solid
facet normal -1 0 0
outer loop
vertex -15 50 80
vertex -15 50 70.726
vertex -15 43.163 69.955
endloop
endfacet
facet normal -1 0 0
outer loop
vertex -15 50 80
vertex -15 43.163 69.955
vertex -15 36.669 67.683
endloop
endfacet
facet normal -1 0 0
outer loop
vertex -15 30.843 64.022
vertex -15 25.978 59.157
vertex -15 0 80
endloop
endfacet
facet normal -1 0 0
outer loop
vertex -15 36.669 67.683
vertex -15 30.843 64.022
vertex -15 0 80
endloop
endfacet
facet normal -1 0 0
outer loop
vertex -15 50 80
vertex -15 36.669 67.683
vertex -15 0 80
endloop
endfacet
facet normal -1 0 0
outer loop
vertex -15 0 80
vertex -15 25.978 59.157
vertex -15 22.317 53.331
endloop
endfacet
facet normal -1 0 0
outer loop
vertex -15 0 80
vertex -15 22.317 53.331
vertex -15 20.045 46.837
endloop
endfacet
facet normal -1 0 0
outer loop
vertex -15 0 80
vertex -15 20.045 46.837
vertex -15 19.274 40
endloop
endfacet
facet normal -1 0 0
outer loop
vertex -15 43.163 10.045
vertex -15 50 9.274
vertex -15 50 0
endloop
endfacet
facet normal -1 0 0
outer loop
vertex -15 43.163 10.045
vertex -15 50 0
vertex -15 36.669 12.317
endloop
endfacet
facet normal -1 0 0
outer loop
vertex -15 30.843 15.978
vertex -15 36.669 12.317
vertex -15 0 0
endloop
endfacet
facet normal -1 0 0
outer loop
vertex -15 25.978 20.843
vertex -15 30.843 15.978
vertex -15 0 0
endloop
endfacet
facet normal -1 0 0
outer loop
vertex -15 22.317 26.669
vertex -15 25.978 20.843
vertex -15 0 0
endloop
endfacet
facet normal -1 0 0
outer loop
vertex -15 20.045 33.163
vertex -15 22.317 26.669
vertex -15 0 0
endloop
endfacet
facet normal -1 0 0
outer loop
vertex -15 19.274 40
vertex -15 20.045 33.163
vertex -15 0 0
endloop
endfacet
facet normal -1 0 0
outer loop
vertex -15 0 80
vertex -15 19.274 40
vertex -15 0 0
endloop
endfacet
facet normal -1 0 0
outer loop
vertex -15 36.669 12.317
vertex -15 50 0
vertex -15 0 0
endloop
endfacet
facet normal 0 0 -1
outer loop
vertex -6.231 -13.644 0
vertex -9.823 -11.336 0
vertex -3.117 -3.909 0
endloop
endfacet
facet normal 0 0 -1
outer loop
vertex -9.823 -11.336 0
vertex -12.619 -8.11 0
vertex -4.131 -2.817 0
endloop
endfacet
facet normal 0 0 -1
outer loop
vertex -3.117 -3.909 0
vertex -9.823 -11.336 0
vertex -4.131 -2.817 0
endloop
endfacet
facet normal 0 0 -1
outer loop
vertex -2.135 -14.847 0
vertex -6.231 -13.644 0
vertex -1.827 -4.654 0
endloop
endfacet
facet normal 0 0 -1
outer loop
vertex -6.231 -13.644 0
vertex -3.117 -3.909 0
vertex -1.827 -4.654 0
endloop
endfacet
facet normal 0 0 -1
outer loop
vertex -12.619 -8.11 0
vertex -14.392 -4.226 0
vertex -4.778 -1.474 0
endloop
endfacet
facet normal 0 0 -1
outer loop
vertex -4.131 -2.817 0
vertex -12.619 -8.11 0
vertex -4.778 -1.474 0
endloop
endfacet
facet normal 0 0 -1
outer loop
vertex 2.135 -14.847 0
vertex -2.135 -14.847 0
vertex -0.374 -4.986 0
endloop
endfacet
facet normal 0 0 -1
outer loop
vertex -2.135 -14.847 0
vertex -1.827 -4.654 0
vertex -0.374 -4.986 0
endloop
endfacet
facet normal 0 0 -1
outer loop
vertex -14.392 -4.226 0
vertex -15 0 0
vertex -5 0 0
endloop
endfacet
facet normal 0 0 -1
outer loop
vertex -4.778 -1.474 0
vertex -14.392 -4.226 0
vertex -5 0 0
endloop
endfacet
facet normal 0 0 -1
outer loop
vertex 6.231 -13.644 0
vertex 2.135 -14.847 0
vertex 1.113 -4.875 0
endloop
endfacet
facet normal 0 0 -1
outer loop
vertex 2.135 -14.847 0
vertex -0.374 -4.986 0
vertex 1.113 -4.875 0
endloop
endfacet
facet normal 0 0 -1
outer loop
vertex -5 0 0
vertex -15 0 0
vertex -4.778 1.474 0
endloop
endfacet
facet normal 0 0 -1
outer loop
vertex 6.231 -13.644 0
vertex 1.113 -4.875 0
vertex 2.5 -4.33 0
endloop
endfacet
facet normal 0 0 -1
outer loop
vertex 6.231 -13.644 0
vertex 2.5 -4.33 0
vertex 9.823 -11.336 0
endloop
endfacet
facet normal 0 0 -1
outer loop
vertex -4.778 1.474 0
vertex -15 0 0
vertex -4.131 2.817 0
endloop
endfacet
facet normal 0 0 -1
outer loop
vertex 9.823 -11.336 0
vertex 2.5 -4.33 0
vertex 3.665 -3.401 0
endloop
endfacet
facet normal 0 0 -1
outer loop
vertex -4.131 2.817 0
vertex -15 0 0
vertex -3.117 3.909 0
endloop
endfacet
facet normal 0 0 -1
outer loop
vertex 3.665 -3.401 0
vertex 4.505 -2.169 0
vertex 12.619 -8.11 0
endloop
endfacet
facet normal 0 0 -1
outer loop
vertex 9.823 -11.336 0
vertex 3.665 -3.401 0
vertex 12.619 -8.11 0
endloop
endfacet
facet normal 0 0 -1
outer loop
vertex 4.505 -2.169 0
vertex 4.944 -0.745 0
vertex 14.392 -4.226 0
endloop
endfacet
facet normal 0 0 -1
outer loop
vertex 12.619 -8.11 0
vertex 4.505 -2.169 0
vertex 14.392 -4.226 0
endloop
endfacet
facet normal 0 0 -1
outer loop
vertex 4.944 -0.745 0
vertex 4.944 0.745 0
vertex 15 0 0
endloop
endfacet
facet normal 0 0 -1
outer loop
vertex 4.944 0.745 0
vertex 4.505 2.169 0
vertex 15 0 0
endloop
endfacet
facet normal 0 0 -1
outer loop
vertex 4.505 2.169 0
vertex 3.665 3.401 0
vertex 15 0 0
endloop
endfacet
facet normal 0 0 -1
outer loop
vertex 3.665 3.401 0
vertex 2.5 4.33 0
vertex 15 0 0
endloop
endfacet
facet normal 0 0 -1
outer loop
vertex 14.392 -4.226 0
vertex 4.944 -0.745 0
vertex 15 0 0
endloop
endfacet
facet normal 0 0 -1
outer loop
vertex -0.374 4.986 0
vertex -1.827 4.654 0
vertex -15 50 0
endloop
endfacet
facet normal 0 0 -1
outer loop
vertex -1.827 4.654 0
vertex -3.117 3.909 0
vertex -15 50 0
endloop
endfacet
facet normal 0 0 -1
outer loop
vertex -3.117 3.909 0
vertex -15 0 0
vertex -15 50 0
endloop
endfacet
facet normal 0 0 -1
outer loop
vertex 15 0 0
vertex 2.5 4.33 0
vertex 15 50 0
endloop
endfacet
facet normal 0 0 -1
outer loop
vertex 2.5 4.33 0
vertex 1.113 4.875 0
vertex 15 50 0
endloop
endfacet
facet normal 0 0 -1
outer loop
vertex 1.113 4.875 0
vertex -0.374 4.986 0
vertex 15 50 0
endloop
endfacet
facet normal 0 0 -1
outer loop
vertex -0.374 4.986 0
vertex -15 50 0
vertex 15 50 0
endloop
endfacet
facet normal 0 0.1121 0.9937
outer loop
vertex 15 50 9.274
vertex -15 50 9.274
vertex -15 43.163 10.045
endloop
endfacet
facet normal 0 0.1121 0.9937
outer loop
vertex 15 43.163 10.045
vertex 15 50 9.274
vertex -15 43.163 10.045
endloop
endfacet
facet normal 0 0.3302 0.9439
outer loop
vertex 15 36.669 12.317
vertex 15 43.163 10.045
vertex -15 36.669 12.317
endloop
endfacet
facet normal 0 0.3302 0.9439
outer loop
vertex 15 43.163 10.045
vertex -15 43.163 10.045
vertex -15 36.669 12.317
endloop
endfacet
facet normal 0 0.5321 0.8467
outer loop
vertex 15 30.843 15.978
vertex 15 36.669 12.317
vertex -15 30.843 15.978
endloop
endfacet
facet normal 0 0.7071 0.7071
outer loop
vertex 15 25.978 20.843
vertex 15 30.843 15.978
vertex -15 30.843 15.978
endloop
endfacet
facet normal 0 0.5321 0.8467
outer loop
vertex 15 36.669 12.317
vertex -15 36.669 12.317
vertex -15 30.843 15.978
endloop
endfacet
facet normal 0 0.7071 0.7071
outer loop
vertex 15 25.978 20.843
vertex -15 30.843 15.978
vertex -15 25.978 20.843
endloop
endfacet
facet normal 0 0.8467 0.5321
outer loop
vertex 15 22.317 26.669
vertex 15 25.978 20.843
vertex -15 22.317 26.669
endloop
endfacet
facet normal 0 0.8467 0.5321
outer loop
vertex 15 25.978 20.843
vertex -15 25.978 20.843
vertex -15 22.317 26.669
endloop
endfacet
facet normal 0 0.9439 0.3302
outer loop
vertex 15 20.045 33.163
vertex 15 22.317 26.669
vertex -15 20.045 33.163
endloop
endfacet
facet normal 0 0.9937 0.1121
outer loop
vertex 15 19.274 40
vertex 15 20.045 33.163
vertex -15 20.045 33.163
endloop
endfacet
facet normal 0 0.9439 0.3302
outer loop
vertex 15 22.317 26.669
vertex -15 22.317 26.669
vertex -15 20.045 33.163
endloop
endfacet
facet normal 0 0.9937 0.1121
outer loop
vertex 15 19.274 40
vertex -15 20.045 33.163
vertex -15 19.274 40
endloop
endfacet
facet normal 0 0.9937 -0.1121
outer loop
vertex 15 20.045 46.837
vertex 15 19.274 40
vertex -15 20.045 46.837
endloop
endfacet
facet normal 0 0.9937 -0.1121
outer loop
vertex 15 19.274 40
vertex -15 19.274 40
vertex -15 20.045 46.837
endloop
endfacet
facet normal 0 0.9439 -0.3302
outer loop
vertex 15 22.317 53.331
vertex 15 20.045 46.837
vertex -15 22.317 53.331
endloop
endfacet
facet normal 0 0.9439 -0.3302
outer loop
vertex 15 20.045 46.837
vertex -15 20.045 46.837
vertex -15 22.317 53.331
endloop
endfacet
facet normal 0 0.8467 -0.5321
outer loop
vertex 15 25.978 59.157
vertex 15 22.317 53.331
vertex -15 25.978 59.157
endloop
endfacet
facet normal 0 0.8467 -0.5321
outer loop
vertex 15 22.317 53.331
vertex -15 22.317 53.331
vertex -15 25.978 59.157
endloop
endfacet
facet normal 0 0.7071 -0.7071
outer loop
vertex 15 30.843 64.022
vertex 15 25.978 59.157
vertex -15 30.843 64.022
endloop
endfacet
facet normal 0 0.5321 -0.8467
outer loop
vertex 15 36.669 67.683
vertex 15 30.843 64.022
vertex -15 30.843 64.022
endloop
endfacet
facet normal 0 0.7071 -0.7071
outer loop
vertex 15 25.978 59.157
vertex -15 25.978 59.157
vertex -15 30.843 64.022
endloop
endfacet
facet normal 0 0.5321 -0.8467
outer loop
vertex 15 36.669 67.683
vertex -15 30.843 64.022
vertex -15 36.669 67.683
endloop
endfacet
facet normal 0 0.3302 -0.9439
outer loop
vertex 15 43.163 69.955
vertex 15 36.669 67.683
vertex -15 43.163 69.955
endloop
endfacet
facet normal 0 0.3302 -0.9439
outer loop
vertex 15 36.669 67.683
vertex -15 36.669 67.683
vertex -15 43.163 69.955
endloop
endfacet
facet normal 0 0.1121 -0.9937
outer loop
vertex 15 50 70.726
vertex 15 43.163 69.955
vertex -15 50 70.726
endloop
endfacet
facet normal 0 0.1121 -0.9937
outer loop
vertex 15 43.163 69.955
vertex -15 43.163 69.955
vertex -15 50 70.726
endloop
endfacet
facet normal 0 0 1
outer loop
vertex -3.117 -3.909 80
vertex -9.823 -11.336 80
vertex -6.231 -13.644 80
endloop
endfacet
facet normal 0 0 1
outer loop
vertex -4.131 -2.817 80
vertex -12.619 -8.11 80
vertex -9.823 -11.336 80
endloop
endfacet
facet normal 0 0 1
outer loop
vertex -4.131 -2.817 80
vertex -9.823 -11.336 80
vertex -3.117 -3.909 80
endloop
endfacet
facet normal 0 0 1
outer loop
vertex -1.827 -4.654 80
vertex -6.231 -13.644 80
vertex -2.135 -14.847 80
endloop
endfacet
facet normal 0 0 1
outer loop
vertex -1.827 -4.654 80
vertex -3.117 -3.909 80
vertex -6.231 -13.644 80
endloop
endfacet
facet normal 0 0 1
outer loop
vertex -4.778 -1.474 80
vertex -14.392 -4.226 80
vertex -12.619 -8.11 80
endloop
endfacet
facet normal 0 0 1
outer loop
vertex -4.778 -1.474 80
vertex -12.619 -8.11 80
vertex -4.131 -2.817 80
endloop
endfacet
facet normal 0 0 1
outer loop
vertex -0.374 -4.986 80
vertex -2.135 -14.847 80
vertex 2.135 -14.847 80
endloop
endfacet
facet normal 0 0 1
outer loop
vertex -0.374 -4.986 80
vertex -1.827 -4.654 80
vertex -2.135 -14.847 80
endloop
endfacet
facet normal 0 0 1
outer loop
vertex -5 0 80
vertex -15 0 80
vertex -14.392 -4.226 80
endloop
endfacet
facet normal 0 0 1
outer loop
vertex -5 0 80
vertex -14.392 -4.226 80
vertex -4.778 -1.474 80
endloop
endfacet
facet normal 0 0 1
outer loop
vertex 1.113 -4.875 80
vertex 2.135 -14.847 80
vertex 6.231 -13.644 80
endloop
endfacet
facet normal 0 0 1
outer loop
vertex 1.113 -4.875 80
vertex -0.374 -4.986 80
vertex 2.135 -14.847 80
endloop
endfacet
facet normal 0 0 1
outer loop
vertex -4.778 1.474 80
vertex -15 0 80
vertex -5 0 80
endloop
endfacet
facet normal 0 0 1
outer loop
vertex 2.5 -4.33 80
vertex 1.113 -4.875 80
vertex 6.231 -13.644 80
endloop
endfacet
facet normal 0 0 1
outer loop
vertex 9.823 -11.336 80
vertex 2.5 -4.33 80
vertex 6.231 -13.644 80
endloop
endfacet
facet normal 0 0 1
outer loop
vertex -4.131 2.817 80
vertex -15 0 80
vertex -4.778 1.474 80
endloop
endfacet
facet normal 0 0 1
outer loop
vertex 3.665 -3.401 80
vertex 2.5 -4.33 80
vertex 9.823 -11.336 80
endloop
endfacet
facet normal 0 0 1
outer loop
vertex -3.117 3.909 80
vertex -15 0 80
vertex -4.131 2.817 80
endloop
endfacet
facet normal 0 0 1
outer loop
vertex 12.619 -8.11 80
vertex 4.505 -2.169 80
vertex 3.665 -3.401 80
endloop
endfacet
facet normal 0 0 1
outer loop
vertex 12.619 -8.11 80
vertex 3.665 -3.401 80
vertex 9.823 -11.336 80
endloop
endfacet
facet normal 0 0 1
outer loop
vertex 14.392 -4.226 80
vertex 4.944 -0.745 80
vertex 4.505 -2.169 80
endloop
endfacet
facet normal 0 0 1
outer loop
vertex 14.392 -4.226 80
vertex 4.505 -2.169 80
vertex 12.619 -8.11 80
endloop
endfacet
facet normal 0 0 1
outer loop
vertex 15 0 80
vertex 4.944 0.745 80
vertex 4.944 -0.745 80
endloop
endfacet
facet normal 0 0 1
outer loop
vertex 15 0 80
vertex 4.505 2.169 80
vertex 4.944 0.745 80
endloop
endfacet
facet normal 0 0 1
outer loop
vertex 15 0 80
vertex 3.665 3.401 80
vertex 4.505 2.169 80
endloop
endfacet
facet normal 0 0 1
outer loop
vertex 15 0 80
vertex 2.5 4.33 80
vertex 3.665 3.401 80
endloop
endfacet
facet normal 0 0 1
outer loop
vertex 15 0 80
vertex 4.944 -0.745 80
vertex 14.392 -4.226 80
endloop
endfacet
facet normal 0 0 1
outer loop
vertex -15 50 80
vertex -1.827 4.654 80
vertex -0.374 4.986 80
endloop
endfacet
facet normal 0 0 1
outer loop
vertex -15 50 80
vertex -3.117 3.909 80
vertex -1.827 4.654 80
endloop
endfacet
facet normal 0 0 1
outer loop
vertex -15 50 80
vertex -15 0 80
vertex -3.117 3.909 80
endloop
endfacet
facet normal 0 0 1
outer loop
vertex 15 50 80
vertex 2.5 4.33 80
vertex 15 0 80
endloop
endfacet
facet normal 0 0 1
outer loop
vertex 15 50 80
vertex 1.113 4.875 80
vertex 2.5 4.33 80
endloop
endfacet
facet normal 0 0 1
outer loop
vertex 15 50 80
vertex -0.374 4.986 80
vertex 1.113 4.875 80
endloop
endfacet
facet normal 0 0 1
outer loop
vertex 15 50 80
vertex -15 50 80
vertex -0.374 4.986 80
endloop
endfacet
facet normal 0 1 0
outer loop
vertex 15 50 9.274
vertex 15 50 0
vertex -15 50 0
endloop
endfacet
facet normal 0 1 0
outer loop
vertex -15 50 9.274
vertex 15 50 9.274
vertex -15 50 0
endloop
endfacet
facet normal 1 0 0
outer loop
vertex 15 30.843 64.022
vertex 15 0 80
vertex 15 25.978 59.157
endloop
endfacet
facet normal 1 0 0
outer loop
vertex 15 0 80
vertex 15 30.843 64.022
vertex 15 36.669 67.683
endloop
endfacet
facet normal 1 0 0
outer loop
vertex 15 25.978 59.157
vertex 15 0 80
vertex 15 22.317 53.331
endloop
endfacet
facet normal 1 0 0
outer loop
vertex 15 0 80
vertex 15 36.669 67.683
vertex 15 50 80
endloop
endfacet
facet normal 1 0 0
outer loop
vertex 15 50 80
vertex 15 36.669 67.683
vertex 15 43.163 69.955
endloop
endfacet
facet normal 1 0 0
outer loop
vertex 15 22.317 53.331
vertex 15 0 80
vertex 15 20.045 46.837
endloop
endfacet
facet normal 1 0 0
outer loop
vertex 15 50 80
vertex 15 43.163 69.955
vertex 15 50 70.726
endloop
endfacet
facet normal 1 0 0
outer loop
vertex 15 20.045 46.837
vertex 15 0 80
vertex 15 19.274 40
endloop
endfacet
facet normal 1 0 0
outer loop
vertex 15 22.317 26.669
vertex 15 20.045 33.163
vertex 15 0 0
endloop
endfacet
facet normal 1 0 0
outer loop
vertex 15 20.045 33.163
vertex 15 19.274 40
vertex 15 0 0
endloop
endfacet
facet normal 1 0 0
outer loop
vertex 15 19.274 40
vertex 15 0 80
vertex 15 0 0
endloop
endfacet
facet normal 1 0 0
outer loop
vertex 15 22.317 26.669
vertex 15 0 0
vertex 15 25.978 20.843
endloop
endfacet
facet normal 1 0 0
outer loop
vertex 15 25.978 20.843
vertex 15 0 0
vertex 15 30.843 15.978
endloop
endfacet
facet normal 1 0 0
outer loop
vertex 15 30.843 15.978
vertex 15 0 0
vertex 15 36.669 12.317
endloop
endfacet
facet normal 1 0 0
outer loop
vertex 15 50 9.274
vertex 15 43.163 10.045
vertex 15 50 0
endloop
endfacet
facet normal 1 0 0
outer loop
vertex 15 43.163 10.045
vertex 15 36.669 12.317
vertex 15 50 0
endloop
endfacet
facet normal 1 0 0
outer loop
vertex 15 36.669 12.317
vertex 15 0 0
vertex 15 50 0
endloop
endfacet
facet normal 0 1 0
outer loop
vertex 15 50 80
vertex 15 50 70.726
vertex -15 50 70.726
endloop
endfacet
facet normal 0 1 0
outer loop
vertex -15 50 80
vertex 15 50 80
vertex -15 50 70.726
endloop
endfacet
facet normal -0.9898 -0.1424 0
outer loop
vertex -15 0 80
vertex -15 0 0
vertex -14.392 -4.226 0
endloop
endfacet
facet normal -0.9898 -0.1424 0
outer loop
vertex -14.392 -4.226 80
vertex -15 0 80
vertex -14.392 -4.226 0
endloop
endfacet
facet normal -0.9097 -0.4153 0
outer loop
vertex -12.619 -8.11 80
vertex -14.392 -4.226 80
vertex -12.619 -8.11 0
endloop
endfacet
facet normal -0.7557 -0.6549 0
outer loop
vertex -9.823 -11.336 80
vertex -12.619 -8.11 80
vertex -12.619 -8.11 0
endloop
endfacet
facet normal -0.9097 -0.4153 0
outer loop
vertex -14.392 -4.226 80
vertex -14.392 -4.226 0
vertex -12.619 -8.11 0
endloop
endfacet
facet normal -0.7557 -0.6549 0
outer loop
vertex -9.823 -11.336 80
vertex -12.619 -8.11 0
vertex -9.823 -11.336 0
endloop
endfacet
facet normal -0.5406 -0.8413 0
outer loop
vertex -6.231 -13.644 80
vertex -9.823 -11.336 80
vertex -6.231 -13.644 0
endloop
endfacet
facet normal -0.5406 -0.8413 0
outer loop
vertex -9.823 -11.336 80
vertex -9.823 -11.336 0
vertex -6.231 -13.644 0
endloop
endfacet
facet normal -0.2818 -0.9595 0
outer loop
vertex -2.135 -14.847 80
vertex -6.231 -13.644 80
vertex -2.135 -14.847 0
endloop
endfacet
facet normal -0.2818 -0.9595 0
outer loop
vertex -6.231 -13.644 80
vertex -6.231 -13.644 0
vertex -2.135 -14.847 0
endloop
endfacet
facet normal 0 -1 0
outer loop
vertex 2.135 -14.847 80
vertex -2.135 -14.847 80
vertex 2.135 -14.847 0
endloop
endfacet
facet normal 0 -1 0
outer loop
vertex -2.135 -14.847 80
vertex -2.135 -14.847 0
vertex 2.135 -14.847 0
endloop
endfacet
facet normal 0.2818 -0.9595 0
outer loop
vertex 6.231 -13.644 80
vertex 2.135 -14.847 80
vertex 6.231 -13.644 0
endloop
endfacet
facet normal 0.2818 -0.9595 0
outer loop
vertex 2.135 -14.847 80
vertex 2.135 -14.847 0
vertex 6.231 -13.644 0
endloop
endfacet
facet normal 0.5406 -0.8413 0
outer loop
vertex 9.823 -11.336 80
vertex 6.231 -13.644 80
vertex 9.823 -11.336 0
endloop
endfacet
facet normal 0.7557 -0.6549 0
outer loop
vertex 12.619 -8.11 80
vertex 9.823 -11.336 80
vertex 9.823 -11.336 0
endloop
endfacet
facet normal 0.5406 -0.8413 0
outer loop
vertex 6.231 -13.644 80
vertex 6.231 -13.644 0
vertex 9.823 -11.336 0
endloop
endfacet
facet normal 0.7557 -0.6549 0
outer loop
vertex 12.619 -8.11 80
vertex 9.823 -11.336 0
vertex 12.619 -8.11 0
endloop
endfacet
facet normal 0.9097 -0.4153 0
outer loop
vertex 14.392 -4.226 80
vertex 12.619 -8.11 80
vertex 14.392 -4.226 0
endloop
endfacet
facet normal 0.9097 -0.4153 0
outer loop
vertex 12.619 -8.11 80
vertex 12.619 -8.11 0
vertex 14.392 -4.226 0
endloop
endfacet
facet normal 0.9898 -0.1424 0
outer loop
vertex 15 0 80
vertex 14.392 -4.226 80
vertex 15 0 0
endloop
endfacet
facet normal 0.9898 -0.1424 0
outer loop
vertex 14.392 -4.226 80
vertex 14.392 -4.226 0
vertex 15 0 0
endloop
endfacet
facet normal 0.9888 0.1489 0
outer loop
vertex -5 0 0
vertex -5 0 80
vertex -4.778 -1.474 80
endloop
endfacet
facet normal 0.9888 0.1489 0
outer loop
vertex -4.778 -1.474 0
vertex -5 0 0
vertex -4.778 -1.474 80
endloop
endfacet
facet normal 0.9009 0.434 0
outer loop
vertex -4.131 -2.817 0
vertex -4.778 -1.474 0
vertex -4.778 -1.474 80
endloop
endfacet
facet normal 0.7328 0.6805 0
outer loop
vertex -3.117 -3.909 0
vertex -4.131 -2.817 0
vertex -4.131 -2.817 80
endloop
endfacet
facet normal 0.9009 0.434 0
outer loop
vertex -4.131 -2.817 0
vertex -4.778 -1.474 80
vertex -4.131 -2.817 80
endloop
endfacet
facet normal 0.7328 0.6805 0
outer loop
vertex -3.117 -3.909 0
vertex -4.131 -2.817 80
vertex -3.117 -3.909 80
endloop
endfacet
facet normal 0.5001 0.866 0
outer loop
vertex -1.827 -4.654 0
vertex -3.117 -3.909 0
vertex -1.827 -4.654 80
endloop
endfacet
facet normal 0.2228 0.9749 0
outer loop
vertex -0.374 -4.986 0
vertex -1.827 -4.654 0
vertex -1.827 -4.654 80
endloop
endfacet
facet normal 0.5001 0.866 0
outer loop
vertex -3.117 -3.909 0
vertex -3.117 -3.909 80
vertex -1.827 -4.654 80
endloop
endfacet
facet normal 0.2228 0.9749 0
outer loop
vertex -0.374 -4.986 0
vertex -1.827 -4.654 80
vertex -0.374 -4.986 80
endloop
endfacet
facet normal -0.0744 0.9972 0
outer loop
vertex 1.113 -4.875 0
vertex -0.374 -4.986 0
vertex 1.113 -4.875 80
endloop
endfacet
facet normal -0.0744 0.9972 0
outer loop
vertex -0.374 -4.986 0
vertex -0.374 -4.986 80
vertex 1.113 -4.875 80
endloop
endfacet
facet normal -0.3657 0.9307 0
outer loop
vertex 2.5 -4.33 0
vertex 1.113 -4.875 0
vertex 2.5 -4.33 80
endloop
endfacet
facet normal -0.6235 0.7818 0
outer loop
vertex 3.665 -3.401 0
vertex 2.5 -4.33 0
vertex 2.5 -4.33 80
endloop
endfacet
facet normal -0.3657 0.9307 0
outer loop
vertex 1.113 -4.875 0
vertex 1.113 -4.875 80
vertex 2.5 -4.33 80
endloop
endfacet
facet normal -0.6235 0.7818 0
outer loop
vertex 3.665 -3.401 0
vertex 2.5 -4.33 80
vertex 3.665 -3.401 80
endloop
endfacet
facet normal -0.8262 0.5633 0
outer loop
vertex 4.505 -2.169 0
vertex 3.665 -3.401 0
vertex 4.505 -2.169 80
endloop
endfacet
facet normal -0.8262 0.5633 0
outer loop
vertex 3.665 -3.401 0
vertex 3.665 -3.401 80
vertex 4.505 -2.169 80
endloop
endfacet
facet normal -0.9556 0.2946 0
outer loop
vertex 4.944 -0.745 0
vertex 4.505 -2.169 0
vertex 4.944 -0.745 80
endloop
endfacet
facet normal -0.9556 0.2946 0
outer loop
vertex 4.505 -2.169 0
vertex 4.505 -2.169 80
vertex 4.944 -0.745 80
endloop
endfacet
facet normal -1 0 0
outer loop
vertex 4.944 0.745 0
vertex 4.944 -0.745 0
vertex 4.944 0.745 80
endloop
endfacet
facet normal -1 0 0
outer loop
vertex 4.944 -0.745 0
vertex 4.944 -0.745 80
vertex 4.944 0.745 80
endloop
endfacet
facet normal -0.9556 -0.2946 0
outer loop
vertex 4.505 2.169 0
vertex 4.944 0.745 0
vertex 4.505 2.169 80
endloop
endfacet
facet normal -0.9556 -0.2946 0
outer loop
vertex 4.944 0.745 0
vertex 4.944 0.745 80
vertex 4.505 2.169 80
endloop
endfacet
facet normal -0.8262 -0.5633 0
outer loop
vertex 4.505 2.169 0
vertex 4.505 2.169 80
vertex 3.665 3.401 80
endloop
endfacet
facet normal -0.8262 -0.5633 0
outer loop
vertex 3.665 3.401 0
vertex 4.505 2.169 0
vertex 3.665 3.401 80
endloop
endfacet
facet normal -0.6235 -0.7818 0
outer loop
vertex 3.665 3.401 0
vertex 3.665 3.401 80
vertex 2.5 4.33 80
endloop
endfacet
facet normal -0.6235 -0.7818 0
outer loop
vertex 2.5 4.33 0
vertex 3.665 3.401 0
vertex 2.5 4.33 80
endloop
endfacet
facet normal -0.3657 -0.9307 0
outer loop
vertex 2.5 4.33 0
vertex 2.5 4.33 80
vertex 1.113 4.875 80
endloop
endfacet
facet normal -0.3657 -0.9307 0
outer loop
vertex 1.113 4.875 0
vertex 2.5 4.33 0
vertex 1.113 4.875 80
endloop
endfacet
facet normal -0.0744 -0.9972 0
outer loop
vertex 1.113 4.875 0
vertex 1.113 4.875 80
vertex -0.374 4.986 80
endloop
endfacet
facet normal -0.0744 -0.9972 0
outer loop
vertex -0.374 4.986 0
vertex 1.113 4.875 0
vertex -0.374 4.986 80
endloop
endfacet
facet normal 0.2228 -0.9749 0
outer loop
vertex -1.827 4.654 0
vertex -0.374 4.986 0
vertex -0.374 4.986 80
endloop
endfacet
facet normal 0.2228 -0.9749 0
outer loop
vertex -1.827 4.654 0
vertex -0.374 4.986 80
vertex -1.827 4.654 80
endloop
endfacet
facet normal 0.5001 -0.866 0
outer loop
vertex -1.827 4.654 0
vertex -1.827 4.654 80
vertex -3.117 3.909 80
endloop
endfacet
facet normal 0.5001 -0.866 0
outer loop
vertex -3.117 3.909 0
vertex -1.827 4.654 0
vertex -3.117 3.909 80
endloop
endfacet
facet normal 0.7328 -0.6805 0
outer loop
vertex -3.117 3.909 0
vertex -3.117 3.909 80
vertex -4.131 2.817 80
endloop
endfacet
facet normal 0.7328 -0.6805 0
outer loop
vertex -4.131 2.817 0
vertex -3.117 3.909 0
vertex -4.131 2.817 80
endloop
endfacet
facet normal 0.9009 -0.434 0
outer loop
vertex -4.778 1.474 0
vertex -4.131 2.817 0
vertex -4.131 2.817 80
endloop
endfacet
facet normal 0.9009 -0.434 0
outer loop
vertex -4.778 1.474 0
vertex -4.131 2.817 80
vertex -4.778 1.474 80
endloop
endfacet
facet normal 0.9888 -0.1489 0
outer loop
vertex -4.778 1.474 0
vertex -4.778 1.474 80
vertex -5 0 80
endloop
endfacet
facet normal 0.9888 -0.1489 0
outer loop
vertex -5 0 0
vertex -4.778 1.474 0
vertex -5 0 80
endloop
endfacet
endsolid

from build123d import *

# Parameters (mm, degrees)
F1_DEPTH = 80
F3_DEPTH = 55
F5_D     = 10


with BuildPart() as f1:
    # F0 (on Top) → F1 (new body)
    with BuildSketch(Plane.XY):
        with BuildLine():
            ThreePointArc((-15, 0), (0, -15), (15, 0))
            ThreePointArc((15, 0), (0, 15), (-15, 0))
        make_face()
        with BuildLine():
            ThreePointArc((-15, 0), (0, 15), (15, 0))
            Line((15, 0), (15, 50))
            Line((15, 50), (-15, 50))
            Line((-15, 50), (-15, 0))
        make_face()
    extrude(amount=F1_DEPTH)

    # F2 (on face) → F3 (cut)
    with BuildSketch(Plane(origin=(-15, 0, 0), x_dir=(0, -1, 0), z_dir=(-1, 0, 0))):
        with BuildLine():
            ThreePointArc((-50, 9.274351), (-19.274351, 40), (-50, 70.725649))
            Line((-50, 70.725649), (-50, 9.274351))
        make_face()
    extrude(amount=-F3_DEPTH, mode=Mode.SUBTRACT)

    # F5 (through all)
    with Locations(Plane(origin=(0, 0, 0), x_dir=(1, 0, 0), z_dir=(0, 0, -1))):
        with Locations((0, 0)):
            Hole(F5_D / 2)


solid = f1.part
